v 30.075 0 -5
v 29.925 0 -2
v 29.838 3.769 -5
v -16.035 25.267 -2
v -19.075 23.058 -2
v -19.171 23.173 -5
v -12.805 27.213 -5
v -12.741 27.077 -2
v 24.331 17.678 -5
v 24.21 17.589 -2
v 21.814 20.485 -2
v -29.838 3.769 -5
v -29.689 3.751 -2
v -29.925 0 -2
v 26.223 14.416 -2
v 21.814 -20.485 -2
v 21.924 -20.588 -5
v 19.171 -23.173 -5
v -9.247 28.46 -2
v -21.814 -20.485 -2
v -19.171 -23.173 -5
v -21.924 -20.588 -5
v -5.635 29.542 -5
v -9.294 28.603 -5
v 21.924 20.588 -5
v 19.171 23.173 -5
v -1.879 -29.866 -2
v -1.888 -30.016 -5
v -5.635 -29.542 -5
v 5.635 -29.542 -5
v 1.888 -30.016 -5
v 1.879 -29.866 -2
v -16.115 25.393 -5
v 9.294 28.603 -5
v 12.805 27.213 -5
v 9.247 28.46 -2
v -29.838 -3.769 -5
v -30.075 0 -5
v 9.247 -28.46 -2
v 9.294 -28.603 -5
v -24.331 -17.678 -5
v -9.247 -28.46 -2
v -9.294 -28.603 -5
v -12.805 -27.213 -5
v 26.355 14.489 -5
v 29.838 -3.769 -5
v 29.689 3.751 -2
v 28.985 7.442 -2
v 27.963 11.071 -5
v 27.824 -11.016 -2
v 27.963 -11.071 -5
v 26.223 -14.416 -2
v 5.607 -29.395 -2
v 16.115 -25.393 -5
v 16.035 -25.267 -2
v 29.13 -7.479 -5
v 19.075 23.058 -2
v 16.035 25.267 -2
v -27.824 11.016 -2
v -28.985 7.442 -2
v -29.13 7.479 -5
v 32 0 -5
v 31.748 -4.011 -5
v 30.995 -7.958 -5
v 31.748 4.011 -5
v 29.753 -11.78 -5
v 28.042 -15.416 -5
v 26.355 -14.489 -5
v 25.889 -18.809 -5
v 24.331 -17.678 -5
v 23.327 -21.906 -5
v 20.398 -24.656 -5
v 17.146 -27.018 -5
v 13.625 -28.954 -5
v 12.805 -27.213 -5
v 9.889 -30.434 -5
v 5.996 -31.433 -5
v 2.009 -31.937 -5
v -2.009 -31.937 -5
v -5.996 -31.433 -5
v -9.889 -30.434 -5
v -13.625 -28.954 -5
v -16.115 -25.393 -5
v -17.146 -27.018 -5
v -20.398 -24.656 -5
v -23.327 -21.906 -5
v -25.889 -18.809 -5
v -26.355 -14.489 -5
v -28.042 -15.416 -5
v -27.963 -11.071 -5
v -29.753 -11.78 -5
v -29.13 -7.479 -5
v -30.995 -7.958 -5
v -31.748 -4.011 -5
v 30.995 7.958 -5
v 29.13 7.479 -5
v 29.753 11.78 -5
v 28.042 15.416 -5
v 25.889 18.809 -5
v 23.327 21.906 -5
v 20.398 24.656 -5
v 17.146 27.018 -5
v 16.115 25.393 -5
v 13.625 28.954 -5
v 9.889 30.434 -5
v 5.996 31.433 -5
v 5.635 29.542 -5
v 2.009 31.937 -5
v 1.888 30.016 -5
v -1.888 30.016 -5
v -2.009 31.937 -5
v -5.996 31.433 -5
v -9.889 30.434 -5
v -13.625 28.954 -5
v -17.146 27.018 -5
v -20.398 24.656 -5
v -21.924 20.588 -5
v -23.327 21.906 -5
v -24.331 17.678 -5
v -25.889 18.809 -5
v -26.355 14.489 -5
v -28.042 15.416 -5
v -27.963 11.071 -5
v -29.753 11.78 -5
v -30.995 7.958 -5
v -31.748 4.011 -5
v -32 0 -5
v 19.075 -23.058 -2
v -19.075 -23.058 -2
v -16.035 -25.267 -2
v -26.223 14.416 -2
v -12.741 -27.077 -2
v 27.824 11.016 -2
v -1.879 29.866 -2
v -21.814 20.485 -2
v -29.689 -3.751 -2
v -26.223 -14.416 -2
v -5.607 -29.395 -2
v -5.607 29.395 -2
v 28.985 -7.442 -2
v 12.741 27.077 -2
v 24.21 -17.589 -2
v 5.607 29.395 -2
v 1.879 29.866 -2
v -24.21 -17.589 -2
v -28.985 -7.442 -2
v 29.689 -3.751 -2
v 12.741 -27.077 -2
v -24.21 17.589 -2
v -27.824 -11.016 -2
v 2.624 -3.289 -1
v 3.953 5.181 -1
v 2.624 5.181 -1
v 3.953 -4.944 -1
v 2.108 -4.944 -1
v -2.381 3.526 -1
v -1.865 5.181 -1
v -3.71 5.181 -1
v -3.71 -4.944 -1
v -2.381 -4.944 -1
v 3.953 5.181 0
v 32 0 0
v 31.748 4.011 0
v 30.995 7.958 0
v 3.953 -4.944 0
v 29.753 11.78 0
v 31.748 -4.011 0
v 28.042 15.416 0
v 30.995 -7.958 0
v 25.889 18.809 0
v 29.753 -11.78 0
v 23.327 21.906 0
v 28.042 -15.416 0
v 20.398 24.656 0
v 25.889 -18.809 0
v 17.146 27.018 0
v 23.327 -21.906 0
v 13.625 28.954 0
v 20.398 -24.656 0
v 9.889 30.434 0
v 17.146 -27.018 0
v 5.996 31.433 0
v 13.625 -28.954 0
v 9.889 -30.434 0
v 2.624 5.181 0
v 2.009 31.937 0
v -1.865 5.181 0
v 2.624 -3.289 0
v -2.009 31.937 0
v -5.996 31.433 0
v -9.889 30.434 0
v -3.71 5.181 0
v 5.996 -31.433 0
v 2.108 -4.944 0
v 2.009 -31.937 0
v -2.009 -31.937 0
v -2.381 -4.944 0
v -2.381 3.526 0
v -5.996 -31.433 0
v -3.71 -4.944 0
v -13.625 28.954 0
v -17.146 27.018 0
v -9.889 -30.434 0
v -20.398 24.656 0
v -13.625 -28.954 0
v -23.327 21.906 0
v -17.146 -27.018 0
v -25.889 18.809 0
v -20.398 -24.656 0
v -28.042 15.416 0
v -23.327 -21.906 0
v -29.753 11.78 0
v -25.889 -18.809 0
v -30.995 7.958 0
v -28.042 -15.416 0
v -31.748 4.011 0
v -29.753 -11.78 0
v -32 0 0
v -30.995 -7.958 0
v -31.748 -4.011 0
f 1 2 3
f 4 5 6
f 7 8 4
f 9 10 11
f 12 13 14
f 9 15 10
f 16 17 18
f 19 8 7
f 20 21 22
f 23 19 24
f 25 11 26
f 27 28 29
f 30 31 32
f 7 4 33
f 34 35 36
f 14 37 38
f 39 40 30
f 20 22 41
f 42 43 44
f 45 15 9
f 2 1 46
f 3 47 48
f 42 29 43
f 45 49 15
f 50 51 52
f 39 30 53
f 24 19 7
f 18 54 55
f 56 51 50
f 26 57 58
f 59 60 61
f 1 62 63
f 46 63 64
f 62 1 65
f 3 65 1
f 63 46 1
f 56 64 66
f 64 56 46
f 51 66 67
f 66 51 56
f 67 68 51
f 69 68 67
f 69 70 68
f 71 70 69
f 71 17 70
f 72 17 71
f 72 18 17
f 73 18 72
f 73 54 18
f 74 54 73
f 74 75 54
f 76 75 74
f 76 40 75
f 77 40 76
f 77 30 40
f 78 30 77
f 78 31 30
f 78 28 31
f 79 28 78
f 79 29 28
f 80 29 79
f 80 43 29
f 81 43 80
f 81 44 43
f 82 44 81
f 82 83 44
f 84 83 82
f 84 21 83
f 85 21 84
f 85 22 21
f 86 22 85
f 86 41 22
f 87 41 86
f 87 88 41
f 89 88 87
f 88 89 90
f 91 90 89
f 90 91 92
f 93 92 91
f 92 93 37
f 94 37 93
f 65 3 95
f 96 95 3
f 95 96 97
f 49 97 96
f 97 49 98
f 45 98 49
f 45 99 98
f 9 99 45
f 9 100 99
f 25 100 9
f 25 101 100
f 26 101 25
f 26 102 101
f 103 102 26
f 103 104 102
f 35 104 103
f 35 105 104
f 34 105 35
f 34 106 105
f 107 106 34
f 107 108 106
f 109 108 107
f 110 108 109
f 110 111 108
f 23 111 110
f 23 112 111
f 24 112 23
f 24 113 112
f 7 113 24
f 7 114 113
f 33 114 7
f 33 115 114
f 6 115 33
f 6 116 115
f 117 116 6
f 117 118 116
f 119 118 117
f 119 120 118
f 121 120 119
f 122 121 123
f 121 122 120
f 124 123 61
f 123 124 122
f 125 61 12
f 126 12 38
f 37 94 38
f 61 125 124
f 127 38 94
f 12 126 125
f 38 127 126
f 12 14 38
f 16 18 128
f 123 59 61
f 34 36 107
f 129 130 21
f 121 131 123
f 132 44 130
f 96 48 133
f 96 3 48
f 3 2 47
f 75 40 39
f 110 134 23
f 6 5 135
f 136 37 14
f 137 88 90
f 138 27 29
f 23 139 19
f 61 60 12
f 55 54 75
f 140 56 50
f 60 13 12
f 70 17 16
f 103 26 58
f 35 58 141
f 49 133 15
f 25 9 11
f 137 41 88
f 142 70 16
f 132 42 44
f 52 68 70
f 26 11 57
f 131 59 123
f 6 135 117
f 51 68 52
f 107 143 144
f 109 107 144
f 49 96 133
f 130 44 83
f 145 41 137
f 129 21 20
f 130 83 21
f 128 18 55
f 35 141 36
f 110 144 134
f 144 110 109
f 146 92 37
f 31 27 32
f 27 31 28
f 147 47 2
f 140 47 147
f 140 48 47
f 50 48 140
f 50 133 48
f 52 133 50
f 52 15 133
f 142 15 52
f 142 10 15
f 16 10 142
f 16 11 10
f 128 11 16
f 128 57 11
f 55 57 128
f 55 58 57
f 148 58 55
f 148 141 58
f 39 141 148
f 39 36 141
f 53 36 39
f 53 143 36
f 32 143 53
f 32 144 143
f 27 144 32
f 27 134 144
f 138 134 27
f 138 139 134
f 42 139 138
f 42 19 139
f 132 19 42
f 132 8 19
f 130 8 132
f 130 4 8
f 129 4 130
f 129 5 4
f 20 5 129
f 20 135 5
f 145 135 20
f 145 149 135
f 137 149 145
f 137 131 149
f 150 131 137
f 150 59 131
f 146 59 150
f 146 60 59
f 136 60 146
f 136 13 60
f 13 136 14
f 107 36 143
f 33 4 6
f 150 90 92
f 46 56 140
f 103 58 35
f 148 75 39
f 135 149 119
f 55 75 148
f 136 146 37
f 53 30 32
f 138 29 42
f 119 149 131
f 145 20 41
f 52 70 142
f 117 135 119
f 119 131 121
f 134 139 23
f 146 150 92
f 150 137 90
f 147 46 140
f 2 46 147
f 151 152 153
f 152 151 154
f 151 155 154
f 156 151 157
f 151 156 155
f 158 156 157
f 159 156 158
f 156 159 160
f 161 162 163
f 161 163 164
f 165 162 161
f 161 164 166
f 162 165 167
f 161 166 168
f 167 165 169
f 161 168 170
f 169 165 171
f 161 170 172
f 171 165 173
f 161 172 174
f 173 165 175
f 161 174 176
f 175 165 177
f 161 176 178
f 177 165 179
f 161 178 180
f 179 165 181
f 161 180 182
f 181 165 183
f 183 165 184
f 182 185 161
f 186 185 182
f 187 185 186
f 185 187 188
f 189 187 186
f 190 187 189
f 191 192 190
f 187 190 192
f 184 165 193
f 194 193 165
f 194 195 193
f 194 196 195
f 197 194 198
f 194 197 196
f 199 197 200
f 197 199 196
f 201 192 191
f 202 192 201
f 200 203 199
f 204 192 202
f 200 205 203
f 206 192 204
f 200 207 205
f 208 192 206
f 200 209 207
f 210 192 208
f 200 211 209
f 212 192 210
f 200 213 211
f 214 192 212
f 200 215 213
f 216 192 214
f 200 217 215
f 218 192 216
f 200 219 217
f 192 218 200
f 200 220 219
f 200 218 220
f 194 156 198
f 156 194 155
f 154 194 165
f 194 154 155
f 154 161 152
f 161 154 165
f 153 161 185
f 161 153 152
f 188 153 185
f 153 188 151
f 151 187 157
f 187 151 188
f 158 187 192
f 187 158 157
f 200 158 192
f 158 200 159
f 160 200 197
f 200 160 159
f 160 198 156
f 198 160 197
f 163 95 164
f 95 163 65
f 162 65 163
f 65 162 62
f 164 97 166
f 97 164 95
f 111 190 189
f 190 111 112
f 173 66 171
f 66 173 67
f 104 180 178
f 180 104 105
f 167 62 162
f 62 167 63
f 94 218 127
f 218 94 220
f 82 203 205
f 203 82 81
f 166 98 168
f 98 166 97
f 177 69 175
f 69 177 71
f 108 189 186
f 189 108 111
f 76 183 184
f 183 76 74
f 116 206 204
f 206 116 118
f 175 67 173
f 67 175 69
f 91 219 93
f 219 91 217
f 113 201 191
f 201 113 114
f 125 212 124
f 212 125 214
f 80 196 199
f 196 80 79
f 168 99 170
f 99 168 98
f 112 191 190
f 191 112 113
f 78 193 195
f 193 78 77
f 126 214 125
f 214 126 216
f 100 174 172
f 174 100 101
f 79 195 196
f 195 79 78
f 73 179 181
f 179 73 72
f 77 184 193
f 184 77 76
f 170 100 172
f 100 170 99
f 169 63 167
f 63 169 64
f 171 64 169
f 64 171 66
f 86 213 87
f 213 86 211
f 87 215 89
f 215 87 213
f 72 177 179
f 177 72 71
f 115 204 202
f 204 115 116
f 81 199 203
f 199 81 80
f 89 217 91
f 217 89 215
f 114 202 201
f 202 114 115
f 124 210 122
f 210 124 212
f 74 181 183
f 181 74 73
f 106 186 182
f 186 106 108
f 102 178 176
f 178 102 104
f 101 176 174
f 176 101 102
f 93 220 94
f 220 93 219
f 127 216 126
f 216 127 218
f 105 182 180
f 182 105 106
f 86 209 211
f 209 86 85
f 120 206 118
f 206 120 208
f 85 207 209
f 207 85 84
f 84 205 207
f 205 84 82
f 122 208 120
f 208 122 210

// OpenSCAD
$fn = 50;

difference() {
	union() {
		translate(v = [0, 0, -5.0]) {
			cylinder(h = 5, r = 32.0);
		}
	}
	union() {
		#translate(v = [0, 0, -5.0]) {
			cylinder(h = 3, r1 = 30.075, r2 = 29.925);
		}
		translate(v = [0, 0, -1]) {
			linear_extrude(height = 1) {
				text(font = "Impact", halign = "center", size = 10, text = "N", valign = "center");
			}
		}
	}
}
